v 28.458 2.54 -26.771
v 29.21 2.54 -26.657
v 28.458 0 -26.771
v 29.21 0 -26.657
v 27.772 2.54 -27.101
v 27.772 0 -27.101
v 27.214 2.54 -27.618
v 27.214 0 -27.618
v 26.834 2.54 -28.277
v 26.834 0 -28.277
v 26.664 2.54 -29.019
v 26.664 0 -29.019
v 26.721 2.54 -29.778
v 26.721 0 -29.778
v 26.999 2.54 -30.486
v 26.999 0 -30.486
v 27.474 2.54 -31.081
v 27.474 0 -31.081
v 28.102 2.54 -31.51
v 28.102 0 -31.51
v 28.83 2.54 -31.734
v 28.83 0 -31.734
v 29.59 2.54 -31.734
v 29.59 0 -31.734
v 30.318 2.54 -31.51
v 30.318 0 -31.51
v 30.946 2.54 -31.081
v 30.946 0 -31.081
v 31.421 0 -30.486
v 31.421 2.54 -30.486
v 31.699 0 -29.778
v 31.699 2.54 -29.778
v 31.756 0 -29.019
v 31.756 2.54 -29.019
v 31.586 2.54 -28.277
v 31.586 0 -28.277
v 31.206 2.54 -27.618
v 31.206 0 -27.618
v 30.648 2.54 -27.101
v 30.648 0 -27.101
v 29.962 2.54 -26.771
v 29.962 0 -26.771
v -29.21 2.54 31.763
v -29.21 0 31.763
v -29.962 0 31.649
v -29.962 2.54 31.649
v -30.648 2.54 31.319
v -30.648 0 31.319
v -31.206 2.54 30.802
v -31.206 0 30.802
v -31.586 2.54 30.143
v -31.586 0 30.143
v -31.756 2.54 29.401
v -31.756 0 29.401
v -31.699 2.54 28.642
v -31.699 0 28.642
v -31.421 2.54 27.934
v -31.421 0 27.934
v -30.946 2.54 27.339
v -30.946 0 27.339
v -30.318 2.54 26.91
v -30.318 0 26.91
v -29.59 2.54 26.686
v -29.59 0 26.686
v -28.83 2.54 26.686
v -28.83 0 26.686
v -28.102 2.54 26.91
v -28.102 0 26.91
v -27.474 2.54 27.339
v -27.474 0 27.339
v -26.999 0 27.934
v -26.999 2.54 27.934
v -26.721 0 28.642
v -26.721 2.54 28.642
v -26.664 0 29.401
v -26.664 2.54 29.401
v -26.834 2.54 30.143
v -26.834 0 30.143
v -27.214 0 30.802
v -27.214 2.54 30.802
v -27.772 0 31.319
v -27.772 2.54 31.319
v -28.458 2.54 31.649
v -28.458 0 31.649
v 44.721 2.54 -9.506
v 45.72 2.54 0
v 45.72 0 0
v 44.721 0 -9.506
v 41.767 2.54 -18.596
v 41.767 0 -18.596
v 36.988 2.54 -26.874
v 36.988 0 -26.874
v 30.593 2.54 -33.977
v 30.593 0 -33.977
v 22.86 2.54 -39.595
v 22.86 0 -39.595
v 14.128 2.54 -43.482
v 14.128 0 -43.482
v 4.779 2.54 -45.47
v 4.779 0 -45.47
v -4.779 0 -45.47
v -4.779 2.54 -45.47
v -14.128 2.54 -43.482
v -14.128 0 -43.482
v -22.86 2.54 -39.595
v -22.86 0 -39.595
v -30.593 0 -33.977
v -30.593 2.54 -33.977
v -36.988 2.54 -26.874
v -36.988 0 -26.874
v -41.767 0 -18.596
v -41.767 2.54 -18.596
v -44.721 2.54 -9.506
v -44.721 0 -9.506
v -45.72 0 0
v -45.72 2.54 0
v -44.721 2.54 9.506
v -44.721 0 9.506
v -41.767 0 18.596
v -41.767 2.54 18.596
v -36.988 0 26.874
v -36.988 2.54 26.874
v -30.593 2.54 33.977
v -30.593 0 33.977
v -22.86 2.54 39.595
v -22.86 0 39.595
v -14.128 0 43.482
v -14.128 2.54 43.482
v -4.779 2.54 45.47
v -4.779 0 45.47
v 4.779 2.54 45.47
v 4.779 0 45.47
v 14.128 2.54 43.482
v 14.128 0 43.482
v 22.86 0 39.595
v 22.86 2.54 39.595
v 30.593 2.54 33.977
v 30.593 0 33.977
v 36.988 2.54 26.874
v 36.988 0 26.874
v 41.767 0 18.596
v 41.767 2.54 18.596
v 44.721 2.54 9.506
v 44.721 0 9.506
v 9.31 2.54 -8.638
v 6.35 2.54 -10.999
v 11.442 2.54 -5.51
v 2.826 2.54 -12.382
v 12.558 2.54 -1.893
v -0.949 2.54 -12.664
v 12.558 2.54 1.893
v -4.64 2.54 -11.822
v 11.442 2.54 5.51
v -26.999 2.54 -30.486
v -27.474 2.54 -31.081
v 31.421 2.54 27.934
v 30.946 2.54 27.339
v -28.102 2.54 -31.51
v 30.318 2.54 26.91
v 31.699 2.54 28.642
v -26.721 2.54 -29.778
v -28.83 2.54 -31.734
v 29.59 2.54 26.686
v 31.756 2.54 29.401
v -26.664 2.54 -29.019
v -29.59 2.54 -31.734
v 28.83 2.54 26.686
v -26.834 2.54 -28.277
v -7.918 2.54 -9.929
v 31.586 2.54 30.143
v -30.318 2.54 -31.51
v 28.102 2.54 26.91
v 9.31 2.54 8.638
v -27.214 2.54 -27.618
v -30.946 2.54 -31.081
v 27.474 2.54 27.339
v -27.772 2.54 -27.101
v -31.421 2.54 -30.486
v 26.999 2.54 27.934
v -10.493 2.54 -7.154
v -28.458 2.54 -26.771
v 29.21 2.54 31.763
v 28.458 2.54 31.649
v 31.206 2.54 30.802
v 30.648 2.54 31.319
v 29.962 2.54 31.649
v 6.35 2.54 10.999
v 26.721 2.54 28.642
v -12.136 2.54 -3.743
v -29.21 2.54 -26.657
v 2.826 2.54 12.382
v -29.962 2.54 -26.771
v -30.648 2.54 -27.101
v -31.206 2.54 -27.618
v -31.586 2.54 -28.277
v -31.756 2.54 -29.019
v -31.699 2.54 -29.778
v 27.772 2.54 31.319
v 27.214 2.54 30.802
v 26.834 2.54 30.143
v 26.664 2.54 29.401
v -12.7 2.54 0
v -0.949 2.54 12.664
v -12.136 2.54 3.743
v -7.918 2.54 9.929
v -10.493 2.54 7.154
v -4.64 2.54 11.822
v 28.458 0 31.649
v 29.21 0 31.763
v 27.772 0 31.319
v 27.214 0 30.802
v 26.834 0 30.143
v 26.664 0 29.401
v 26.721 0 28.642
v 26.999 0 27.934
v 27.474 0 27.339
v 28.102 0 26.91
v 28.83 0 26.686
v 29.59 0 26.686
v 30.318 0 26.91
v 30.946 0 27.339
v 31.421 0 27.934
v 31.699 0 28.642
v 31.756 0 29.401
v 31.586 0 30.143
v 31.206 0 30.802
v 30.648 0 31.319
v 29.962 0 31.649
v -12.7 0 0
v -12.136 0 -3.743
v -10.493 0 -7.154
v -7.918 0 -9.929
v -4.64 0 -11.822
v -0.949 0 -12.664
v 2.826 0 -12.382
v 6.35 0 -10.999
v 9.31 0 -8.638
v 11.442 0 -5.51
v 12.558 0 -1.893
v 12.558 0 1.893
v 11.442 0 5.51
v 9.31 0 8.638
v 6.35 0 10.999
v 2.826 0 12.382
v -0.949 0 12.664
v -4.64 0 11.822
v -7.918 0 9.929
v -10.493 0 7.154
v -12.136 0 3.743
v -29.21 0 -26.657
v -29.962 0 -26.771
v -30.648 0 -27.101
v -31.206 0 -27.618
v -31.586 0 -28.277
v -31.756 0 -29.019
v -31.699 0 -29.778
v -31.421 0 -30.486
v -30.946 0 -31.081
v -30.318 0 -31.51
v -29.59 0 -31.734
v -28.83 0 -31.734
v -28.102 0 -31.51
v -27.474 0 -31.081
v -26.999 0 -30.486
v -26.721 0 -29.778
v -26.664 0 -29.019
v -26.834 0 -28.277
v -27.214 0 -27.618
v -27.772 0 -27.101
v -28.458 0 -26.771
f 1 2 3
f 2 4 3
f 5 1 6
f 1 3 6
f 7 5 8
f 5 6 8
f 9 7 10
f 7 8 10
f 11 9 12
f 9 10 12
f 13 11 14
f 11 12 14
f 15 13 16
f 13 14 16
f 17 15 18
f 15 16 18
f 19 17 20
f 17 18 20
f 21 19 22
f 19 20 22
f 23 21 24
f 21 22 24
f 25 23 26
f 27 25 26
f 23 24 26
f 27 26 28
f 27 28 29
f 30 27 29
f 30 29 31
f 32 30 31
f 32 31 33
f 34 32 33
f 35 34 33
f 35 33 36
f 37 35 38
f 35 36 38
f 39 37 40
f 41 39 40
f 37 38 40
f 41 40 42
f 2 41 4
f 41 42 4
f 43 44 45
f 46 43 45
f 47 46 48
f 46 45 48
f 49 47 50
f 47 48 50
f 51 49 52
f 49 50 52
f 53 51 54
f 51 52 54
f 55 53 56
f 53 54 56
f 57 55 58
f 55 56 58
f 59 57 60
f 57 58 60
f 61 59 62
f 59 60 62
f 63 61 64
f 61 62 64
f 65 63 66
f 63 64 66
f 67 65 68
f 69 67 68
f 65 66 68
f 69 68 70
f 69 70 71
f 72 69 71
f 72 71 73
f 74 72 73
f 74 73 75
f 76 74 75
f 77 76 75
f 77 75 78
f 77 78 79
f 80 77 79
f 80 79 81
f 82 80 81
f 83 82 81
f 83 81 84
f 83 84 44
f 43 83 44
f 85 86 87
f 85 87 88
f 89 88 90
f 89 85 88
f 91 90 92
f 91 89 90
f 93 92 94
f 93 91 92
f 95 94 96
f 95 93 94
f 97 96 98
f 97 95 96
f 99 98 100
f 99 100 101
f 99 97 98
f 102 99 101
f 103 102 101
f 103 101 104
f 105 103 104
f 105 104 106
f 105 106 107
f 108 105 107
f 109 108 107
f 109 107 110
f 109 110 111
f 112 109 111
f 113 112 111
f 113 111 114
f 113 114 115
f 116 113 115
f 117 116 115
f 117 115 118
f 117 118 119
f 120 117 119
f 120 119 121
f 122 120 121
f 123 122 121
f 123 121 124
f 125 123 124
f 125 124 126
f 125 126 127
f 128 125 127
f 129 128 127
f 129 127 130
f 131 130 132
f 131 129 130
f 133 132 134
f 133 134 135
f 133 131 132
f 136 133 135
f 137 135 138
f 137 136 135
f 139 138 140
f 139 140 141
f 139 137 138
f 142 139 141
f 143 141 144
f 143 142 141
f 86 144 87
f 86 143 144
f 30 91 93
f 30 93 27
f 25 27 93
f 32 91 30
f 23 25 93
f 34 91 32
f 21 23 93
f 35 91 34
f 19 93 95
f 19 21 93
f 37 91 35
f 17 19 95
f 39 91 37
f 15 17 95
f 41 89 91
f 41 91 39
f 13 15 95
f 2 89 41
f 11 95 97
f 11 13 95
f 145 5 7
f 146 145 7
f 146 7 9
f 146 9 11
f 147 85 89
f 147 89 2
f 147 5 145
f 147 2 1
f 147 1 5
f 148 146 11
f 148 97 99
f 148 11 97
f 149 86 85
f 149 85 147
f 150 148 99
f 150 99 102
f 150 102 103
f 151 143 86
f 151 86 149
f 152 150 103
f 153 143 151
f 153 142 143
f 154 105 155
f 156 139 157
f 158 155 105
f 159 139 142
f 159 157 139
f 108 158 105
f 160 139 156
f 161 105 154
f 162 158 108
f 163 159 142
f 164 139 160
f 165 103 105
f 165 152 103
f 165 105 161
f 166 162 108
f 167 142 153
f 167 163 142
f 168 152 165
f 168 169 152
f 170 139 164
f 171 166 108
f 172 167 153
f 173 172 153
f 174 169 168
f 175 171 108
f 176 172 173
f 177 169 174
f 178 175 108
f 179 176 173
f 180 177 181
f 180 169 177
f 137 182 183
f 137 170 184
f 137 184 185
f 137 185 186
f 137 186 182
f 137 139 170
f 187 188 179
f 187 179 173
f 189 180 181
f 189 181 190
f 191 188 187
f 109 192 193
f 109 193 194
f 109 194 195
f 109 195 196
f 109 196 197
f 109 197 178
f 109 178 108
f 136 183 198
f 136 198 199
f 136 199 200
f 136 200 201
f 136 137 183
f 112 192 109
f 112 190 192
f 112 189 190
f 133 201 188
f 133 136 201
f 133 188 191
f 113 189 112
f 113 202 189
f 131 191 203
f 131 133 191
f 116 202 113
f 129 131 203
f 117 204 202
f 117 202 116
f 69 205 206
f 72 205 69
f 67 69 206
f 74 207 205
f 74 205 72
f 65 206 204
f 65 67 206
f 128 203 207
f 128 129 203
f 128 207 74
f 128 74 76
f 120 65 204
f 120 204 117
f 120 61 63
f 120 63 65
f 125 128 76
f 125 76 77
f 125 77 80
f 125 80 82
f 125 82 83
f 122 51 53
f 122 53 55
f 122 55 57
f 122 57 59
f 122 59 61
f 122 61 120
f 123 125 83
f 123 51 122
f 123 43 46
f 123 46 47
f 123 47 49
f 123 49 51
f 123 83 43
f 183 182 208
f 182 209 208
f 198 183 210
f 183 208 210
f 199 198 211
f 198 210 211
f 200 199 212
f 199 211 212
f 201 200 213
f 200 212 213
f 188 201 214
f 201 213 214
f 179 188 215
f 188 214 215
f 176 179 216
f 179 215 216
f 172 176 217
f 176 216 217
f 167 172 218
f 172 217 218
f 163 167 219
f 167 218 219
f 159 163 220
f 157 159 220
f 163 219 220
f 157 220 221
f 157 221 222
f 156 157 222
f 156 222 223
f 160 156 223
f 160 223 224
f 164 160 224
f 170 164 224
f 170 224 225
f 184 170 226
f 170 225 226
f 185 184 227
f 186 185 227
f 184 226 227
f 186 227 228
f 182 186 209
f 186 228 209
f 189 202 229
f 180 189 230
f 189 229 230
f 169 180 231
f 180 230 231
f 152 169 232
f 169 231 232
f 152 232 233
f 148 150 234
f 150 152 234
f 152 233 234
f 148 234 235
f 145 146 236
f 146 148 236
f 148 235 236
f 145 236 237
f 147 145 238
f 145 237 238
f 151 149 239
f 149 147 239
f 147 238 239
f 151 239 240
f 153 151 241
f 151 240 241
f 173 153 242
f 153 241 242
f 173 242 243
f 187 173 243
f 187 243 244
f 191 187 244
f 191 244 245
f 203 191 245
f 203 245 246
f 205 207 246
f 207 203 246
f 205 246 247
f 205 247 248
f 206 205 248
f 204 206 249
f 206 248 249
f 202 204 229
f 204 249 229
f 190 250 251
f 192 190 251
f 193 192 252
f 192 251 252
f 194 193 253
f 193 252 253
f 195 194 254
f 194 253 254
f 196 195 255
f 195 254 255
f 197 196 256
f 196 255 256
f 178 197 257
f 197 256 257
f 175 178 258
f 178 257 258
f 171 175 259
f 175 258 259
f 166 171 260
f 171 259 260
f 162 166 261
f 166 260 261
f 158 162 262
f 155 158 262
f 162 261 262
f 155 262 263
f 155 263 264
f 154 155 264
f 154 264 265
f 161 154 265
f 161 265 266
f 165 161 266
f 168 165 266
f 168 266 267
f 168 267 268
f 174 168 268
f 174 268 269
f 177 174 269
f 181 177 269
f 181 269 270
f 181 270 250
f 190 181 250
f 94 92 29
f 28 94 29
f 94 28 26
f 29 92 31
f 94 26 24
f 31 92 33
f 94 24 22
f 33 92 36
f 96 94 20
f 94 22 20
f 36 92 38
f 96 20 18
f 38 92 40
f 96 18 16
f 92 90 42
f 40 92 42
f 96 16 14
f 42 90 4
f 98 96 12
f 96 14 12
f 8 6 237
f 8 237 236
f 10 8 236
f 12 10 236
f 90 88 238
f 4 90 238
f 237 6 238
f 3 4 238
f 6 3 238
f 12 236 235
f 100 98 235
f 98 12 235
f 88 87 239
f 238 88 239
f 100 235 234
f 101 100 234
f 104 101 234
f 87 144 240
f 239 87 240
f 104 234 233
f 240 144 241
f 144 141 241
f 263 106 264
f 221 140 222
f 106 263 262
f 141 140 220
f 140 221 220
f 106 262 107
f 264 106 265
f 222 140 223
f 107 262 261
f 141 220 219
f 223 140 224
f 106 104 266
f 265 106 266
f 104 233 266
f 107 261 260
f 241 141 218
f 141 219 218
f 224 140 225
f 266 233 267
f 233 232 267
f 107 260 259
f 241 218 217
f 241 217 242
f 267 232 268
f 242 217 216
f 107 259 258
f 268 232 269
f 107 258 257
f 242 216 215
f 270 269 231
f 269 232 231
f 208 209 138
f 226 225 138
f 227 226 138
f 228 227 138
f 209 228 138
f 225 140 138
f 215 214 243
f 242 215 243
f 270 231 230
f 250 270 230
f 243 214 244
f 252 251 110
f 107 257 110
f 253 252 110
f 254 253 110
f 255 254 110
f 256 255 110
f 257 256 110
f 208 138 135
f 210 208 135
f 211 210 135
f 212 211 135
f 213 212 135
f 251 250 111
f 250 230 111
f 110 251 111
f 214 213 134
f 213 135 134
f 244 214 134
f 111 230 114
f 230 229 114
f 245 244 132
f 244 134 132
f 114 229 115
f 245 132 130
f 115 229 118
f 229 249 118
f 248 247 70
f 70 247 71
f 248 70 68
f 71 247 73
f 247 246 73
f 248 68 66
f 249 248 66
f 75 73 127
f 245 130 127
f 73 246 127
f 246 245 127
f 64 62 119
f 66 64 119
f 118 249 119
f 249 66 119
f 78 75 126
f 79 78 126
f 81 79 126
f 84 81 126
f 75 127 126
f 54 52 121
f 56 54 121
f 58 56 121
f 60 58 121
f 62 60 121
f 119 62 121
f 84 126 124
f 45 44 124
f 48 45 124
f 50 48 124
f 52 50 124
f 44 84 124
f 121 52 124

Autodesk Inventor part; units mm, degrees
ref_plane "YZ Plane" through (0, 0, 0) normal (1, 0, 0) x (0, 1, 0)
ref_plane "XZ Plane" through (0, 0, 0) normal (0, 1, 0) x (-1, 0, 0)
ref_plane "XY Plane" through (0, 0, 0) normal (0, 0, 1) x (1, 0, 0)
sketch "Sketch1" plane through (0, 0, 0) normal (0, 1, 0) x (-1, 0, 0)
  circle A0 centre (0, 0) radius 12.7
  line L0 (34.29, 34.29) -> (-34.29, 34.29)
  line L1 (-34.29, 34.29) -> (-34.29, -34.29)
  line L2 (-34.29, -34.29) -> (34.29, -34.29)
  line L3 (34.29, -34.29) -> (34.29, 34.29)
  line L4 (34.29, 34.29) -> (-34.29, -34.29) construction
  line L5 (-34.29, 34.29) -> (34.29, -34.29) construction
  circle A1 centre (0, 0) radius 48.4934
  dimension "d0" = 25.4
  dimension "d4" = 68.58
  dimension "d5" = 68.58
extrude "Extrusion1" add sketch "Sketch1" along normal blind 2.54
sketch "Sketch2" plane through (0, 2.54, 0) normal (0, 1, 0) x (1, 0, 0)
  line L0 (-29.21, -29.21) -> (29.21, -29.21) construction
  line L1 (29.21, -29.21) -> (29.21, 29.21) construction
  line L2 (29.21, 29.21) -> (-29.21, 29.21) construction
  line L3 (-29.21, 29.21) -> (-29.21, -29.21) construction
  line L4 (-29.21, -29.21) -> (29.21, 29.21) construction
  line L5 (29.21, -29.21) -> (-29.21, 29.21) construction
  line L6 (34.29, 34.29) -> (-34.29, 34.29) projected
  line L7 (34.29, -34.29) -> (34.29, 34.29) projected
  circle A0 centre (0, 0) radius 41.3092 construction
  circle A1 centre (0, 0) radius 48.4934 construction
  dimension "d24" = 7.1842
hole "Hole1" at (-29.21, 2.54, -29.21) at (29.21, 2.54, -29.21) at (29.21, 2.54, 29.21) at (-29.21, 2.54, 29.21) direction (0, -1, 0) diameter 5.1054 end through all clearance for "Flat Head Machine Screw (82)" size "#10" standard "Ansi Unified Screw Threads"
sketch "Sketch3" plane through (0, 2.54, 0) normal (0, 1, 0) x (1, 0, 0)
  circle A0 centre (0, 0) radius 38.1
  circle A1 centre (0, 0) radius 12.7 projected
  circle A2 centre (0, 0) radius 25.4
  circle A3 centre (0, 0) radius 47.7012
  dimension "d17" = 76.2
  dimension "d18" = 50.8
  dimension "d19" = 95.4024
sketch "Sketch4" plane through (0, 2.54, 0) normal (0, 1, 0) x (1, 0, 0)
  circle A0 centre (0, 0) radius 12.7 projected
  circle A1 centre (0, 0) radius 45.72
  dimension "d20" = 91.44
extrude "Extrusion2" cut sketch "Sketch4" against normal blind 25.4 keep common part
properties part number "weldpart" material "Stainless Steel"
